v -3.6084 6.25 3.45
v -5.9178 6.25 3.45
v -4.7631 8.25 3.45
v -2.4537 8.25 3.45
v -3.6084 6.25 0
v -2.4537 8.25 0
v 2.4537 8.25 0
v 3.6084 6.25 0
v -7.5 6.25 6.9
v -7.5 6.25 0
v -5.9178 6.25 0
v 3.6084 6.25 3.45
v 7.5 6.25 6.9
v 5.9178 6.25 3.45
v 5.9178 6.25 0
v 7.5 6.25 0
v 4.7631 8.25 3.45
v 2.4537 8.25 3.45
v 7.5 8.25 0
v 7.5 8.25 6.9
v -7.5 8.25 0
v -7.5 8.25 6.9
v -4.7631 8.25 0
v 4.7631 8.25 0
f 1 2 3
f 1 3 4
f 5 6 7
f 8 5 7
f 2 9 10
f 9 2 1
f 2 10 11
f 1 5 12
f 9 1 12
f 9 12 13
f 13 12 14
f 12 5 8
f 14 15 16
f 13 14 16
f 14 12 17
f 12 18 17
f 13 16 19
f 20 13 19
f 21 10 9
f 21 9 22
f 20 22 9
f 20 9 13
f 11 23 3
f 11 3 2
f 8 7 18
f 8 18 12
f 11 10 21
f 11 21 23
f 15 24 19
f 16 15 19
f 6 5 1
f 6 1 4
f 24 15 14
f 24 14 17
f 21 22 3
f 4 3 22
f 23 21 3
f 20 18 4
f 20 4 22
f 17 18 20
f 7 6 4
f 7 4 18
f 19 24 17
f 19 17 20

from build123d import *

# Parameters (mm, degrees)
F0_W     = 15
F0_H     = 2
F1_DEPTH = 6.9
F3_DEPTH = 3.45


with BuildPart() as f1:
    # F0 (on Top) → F1 (new body)
    with BuildSketch(Plane.XY):
        with Locations((0, 7.25)):
            Rectangle(F0_W, F0_H)
    extrude(amount=F1_DEPTH)

    # F2 (on Top) → F3 (cut)
    with BuildSketch(Plane.XY):
        Polygon((-4.76314, 8.25), (-5.91784, 6.25), (-3.608439, 6.25), (-2.453739, 8.25), align=None)
        Polygon((3.608439, 6.25), (5.91784, 6.25), (4.76314, 8.25), (2.453739, 8.25), align=None)
    extrude(amount=F3_DEPTH, mode=Mode.SUBTRACT)


solid = f1.part
